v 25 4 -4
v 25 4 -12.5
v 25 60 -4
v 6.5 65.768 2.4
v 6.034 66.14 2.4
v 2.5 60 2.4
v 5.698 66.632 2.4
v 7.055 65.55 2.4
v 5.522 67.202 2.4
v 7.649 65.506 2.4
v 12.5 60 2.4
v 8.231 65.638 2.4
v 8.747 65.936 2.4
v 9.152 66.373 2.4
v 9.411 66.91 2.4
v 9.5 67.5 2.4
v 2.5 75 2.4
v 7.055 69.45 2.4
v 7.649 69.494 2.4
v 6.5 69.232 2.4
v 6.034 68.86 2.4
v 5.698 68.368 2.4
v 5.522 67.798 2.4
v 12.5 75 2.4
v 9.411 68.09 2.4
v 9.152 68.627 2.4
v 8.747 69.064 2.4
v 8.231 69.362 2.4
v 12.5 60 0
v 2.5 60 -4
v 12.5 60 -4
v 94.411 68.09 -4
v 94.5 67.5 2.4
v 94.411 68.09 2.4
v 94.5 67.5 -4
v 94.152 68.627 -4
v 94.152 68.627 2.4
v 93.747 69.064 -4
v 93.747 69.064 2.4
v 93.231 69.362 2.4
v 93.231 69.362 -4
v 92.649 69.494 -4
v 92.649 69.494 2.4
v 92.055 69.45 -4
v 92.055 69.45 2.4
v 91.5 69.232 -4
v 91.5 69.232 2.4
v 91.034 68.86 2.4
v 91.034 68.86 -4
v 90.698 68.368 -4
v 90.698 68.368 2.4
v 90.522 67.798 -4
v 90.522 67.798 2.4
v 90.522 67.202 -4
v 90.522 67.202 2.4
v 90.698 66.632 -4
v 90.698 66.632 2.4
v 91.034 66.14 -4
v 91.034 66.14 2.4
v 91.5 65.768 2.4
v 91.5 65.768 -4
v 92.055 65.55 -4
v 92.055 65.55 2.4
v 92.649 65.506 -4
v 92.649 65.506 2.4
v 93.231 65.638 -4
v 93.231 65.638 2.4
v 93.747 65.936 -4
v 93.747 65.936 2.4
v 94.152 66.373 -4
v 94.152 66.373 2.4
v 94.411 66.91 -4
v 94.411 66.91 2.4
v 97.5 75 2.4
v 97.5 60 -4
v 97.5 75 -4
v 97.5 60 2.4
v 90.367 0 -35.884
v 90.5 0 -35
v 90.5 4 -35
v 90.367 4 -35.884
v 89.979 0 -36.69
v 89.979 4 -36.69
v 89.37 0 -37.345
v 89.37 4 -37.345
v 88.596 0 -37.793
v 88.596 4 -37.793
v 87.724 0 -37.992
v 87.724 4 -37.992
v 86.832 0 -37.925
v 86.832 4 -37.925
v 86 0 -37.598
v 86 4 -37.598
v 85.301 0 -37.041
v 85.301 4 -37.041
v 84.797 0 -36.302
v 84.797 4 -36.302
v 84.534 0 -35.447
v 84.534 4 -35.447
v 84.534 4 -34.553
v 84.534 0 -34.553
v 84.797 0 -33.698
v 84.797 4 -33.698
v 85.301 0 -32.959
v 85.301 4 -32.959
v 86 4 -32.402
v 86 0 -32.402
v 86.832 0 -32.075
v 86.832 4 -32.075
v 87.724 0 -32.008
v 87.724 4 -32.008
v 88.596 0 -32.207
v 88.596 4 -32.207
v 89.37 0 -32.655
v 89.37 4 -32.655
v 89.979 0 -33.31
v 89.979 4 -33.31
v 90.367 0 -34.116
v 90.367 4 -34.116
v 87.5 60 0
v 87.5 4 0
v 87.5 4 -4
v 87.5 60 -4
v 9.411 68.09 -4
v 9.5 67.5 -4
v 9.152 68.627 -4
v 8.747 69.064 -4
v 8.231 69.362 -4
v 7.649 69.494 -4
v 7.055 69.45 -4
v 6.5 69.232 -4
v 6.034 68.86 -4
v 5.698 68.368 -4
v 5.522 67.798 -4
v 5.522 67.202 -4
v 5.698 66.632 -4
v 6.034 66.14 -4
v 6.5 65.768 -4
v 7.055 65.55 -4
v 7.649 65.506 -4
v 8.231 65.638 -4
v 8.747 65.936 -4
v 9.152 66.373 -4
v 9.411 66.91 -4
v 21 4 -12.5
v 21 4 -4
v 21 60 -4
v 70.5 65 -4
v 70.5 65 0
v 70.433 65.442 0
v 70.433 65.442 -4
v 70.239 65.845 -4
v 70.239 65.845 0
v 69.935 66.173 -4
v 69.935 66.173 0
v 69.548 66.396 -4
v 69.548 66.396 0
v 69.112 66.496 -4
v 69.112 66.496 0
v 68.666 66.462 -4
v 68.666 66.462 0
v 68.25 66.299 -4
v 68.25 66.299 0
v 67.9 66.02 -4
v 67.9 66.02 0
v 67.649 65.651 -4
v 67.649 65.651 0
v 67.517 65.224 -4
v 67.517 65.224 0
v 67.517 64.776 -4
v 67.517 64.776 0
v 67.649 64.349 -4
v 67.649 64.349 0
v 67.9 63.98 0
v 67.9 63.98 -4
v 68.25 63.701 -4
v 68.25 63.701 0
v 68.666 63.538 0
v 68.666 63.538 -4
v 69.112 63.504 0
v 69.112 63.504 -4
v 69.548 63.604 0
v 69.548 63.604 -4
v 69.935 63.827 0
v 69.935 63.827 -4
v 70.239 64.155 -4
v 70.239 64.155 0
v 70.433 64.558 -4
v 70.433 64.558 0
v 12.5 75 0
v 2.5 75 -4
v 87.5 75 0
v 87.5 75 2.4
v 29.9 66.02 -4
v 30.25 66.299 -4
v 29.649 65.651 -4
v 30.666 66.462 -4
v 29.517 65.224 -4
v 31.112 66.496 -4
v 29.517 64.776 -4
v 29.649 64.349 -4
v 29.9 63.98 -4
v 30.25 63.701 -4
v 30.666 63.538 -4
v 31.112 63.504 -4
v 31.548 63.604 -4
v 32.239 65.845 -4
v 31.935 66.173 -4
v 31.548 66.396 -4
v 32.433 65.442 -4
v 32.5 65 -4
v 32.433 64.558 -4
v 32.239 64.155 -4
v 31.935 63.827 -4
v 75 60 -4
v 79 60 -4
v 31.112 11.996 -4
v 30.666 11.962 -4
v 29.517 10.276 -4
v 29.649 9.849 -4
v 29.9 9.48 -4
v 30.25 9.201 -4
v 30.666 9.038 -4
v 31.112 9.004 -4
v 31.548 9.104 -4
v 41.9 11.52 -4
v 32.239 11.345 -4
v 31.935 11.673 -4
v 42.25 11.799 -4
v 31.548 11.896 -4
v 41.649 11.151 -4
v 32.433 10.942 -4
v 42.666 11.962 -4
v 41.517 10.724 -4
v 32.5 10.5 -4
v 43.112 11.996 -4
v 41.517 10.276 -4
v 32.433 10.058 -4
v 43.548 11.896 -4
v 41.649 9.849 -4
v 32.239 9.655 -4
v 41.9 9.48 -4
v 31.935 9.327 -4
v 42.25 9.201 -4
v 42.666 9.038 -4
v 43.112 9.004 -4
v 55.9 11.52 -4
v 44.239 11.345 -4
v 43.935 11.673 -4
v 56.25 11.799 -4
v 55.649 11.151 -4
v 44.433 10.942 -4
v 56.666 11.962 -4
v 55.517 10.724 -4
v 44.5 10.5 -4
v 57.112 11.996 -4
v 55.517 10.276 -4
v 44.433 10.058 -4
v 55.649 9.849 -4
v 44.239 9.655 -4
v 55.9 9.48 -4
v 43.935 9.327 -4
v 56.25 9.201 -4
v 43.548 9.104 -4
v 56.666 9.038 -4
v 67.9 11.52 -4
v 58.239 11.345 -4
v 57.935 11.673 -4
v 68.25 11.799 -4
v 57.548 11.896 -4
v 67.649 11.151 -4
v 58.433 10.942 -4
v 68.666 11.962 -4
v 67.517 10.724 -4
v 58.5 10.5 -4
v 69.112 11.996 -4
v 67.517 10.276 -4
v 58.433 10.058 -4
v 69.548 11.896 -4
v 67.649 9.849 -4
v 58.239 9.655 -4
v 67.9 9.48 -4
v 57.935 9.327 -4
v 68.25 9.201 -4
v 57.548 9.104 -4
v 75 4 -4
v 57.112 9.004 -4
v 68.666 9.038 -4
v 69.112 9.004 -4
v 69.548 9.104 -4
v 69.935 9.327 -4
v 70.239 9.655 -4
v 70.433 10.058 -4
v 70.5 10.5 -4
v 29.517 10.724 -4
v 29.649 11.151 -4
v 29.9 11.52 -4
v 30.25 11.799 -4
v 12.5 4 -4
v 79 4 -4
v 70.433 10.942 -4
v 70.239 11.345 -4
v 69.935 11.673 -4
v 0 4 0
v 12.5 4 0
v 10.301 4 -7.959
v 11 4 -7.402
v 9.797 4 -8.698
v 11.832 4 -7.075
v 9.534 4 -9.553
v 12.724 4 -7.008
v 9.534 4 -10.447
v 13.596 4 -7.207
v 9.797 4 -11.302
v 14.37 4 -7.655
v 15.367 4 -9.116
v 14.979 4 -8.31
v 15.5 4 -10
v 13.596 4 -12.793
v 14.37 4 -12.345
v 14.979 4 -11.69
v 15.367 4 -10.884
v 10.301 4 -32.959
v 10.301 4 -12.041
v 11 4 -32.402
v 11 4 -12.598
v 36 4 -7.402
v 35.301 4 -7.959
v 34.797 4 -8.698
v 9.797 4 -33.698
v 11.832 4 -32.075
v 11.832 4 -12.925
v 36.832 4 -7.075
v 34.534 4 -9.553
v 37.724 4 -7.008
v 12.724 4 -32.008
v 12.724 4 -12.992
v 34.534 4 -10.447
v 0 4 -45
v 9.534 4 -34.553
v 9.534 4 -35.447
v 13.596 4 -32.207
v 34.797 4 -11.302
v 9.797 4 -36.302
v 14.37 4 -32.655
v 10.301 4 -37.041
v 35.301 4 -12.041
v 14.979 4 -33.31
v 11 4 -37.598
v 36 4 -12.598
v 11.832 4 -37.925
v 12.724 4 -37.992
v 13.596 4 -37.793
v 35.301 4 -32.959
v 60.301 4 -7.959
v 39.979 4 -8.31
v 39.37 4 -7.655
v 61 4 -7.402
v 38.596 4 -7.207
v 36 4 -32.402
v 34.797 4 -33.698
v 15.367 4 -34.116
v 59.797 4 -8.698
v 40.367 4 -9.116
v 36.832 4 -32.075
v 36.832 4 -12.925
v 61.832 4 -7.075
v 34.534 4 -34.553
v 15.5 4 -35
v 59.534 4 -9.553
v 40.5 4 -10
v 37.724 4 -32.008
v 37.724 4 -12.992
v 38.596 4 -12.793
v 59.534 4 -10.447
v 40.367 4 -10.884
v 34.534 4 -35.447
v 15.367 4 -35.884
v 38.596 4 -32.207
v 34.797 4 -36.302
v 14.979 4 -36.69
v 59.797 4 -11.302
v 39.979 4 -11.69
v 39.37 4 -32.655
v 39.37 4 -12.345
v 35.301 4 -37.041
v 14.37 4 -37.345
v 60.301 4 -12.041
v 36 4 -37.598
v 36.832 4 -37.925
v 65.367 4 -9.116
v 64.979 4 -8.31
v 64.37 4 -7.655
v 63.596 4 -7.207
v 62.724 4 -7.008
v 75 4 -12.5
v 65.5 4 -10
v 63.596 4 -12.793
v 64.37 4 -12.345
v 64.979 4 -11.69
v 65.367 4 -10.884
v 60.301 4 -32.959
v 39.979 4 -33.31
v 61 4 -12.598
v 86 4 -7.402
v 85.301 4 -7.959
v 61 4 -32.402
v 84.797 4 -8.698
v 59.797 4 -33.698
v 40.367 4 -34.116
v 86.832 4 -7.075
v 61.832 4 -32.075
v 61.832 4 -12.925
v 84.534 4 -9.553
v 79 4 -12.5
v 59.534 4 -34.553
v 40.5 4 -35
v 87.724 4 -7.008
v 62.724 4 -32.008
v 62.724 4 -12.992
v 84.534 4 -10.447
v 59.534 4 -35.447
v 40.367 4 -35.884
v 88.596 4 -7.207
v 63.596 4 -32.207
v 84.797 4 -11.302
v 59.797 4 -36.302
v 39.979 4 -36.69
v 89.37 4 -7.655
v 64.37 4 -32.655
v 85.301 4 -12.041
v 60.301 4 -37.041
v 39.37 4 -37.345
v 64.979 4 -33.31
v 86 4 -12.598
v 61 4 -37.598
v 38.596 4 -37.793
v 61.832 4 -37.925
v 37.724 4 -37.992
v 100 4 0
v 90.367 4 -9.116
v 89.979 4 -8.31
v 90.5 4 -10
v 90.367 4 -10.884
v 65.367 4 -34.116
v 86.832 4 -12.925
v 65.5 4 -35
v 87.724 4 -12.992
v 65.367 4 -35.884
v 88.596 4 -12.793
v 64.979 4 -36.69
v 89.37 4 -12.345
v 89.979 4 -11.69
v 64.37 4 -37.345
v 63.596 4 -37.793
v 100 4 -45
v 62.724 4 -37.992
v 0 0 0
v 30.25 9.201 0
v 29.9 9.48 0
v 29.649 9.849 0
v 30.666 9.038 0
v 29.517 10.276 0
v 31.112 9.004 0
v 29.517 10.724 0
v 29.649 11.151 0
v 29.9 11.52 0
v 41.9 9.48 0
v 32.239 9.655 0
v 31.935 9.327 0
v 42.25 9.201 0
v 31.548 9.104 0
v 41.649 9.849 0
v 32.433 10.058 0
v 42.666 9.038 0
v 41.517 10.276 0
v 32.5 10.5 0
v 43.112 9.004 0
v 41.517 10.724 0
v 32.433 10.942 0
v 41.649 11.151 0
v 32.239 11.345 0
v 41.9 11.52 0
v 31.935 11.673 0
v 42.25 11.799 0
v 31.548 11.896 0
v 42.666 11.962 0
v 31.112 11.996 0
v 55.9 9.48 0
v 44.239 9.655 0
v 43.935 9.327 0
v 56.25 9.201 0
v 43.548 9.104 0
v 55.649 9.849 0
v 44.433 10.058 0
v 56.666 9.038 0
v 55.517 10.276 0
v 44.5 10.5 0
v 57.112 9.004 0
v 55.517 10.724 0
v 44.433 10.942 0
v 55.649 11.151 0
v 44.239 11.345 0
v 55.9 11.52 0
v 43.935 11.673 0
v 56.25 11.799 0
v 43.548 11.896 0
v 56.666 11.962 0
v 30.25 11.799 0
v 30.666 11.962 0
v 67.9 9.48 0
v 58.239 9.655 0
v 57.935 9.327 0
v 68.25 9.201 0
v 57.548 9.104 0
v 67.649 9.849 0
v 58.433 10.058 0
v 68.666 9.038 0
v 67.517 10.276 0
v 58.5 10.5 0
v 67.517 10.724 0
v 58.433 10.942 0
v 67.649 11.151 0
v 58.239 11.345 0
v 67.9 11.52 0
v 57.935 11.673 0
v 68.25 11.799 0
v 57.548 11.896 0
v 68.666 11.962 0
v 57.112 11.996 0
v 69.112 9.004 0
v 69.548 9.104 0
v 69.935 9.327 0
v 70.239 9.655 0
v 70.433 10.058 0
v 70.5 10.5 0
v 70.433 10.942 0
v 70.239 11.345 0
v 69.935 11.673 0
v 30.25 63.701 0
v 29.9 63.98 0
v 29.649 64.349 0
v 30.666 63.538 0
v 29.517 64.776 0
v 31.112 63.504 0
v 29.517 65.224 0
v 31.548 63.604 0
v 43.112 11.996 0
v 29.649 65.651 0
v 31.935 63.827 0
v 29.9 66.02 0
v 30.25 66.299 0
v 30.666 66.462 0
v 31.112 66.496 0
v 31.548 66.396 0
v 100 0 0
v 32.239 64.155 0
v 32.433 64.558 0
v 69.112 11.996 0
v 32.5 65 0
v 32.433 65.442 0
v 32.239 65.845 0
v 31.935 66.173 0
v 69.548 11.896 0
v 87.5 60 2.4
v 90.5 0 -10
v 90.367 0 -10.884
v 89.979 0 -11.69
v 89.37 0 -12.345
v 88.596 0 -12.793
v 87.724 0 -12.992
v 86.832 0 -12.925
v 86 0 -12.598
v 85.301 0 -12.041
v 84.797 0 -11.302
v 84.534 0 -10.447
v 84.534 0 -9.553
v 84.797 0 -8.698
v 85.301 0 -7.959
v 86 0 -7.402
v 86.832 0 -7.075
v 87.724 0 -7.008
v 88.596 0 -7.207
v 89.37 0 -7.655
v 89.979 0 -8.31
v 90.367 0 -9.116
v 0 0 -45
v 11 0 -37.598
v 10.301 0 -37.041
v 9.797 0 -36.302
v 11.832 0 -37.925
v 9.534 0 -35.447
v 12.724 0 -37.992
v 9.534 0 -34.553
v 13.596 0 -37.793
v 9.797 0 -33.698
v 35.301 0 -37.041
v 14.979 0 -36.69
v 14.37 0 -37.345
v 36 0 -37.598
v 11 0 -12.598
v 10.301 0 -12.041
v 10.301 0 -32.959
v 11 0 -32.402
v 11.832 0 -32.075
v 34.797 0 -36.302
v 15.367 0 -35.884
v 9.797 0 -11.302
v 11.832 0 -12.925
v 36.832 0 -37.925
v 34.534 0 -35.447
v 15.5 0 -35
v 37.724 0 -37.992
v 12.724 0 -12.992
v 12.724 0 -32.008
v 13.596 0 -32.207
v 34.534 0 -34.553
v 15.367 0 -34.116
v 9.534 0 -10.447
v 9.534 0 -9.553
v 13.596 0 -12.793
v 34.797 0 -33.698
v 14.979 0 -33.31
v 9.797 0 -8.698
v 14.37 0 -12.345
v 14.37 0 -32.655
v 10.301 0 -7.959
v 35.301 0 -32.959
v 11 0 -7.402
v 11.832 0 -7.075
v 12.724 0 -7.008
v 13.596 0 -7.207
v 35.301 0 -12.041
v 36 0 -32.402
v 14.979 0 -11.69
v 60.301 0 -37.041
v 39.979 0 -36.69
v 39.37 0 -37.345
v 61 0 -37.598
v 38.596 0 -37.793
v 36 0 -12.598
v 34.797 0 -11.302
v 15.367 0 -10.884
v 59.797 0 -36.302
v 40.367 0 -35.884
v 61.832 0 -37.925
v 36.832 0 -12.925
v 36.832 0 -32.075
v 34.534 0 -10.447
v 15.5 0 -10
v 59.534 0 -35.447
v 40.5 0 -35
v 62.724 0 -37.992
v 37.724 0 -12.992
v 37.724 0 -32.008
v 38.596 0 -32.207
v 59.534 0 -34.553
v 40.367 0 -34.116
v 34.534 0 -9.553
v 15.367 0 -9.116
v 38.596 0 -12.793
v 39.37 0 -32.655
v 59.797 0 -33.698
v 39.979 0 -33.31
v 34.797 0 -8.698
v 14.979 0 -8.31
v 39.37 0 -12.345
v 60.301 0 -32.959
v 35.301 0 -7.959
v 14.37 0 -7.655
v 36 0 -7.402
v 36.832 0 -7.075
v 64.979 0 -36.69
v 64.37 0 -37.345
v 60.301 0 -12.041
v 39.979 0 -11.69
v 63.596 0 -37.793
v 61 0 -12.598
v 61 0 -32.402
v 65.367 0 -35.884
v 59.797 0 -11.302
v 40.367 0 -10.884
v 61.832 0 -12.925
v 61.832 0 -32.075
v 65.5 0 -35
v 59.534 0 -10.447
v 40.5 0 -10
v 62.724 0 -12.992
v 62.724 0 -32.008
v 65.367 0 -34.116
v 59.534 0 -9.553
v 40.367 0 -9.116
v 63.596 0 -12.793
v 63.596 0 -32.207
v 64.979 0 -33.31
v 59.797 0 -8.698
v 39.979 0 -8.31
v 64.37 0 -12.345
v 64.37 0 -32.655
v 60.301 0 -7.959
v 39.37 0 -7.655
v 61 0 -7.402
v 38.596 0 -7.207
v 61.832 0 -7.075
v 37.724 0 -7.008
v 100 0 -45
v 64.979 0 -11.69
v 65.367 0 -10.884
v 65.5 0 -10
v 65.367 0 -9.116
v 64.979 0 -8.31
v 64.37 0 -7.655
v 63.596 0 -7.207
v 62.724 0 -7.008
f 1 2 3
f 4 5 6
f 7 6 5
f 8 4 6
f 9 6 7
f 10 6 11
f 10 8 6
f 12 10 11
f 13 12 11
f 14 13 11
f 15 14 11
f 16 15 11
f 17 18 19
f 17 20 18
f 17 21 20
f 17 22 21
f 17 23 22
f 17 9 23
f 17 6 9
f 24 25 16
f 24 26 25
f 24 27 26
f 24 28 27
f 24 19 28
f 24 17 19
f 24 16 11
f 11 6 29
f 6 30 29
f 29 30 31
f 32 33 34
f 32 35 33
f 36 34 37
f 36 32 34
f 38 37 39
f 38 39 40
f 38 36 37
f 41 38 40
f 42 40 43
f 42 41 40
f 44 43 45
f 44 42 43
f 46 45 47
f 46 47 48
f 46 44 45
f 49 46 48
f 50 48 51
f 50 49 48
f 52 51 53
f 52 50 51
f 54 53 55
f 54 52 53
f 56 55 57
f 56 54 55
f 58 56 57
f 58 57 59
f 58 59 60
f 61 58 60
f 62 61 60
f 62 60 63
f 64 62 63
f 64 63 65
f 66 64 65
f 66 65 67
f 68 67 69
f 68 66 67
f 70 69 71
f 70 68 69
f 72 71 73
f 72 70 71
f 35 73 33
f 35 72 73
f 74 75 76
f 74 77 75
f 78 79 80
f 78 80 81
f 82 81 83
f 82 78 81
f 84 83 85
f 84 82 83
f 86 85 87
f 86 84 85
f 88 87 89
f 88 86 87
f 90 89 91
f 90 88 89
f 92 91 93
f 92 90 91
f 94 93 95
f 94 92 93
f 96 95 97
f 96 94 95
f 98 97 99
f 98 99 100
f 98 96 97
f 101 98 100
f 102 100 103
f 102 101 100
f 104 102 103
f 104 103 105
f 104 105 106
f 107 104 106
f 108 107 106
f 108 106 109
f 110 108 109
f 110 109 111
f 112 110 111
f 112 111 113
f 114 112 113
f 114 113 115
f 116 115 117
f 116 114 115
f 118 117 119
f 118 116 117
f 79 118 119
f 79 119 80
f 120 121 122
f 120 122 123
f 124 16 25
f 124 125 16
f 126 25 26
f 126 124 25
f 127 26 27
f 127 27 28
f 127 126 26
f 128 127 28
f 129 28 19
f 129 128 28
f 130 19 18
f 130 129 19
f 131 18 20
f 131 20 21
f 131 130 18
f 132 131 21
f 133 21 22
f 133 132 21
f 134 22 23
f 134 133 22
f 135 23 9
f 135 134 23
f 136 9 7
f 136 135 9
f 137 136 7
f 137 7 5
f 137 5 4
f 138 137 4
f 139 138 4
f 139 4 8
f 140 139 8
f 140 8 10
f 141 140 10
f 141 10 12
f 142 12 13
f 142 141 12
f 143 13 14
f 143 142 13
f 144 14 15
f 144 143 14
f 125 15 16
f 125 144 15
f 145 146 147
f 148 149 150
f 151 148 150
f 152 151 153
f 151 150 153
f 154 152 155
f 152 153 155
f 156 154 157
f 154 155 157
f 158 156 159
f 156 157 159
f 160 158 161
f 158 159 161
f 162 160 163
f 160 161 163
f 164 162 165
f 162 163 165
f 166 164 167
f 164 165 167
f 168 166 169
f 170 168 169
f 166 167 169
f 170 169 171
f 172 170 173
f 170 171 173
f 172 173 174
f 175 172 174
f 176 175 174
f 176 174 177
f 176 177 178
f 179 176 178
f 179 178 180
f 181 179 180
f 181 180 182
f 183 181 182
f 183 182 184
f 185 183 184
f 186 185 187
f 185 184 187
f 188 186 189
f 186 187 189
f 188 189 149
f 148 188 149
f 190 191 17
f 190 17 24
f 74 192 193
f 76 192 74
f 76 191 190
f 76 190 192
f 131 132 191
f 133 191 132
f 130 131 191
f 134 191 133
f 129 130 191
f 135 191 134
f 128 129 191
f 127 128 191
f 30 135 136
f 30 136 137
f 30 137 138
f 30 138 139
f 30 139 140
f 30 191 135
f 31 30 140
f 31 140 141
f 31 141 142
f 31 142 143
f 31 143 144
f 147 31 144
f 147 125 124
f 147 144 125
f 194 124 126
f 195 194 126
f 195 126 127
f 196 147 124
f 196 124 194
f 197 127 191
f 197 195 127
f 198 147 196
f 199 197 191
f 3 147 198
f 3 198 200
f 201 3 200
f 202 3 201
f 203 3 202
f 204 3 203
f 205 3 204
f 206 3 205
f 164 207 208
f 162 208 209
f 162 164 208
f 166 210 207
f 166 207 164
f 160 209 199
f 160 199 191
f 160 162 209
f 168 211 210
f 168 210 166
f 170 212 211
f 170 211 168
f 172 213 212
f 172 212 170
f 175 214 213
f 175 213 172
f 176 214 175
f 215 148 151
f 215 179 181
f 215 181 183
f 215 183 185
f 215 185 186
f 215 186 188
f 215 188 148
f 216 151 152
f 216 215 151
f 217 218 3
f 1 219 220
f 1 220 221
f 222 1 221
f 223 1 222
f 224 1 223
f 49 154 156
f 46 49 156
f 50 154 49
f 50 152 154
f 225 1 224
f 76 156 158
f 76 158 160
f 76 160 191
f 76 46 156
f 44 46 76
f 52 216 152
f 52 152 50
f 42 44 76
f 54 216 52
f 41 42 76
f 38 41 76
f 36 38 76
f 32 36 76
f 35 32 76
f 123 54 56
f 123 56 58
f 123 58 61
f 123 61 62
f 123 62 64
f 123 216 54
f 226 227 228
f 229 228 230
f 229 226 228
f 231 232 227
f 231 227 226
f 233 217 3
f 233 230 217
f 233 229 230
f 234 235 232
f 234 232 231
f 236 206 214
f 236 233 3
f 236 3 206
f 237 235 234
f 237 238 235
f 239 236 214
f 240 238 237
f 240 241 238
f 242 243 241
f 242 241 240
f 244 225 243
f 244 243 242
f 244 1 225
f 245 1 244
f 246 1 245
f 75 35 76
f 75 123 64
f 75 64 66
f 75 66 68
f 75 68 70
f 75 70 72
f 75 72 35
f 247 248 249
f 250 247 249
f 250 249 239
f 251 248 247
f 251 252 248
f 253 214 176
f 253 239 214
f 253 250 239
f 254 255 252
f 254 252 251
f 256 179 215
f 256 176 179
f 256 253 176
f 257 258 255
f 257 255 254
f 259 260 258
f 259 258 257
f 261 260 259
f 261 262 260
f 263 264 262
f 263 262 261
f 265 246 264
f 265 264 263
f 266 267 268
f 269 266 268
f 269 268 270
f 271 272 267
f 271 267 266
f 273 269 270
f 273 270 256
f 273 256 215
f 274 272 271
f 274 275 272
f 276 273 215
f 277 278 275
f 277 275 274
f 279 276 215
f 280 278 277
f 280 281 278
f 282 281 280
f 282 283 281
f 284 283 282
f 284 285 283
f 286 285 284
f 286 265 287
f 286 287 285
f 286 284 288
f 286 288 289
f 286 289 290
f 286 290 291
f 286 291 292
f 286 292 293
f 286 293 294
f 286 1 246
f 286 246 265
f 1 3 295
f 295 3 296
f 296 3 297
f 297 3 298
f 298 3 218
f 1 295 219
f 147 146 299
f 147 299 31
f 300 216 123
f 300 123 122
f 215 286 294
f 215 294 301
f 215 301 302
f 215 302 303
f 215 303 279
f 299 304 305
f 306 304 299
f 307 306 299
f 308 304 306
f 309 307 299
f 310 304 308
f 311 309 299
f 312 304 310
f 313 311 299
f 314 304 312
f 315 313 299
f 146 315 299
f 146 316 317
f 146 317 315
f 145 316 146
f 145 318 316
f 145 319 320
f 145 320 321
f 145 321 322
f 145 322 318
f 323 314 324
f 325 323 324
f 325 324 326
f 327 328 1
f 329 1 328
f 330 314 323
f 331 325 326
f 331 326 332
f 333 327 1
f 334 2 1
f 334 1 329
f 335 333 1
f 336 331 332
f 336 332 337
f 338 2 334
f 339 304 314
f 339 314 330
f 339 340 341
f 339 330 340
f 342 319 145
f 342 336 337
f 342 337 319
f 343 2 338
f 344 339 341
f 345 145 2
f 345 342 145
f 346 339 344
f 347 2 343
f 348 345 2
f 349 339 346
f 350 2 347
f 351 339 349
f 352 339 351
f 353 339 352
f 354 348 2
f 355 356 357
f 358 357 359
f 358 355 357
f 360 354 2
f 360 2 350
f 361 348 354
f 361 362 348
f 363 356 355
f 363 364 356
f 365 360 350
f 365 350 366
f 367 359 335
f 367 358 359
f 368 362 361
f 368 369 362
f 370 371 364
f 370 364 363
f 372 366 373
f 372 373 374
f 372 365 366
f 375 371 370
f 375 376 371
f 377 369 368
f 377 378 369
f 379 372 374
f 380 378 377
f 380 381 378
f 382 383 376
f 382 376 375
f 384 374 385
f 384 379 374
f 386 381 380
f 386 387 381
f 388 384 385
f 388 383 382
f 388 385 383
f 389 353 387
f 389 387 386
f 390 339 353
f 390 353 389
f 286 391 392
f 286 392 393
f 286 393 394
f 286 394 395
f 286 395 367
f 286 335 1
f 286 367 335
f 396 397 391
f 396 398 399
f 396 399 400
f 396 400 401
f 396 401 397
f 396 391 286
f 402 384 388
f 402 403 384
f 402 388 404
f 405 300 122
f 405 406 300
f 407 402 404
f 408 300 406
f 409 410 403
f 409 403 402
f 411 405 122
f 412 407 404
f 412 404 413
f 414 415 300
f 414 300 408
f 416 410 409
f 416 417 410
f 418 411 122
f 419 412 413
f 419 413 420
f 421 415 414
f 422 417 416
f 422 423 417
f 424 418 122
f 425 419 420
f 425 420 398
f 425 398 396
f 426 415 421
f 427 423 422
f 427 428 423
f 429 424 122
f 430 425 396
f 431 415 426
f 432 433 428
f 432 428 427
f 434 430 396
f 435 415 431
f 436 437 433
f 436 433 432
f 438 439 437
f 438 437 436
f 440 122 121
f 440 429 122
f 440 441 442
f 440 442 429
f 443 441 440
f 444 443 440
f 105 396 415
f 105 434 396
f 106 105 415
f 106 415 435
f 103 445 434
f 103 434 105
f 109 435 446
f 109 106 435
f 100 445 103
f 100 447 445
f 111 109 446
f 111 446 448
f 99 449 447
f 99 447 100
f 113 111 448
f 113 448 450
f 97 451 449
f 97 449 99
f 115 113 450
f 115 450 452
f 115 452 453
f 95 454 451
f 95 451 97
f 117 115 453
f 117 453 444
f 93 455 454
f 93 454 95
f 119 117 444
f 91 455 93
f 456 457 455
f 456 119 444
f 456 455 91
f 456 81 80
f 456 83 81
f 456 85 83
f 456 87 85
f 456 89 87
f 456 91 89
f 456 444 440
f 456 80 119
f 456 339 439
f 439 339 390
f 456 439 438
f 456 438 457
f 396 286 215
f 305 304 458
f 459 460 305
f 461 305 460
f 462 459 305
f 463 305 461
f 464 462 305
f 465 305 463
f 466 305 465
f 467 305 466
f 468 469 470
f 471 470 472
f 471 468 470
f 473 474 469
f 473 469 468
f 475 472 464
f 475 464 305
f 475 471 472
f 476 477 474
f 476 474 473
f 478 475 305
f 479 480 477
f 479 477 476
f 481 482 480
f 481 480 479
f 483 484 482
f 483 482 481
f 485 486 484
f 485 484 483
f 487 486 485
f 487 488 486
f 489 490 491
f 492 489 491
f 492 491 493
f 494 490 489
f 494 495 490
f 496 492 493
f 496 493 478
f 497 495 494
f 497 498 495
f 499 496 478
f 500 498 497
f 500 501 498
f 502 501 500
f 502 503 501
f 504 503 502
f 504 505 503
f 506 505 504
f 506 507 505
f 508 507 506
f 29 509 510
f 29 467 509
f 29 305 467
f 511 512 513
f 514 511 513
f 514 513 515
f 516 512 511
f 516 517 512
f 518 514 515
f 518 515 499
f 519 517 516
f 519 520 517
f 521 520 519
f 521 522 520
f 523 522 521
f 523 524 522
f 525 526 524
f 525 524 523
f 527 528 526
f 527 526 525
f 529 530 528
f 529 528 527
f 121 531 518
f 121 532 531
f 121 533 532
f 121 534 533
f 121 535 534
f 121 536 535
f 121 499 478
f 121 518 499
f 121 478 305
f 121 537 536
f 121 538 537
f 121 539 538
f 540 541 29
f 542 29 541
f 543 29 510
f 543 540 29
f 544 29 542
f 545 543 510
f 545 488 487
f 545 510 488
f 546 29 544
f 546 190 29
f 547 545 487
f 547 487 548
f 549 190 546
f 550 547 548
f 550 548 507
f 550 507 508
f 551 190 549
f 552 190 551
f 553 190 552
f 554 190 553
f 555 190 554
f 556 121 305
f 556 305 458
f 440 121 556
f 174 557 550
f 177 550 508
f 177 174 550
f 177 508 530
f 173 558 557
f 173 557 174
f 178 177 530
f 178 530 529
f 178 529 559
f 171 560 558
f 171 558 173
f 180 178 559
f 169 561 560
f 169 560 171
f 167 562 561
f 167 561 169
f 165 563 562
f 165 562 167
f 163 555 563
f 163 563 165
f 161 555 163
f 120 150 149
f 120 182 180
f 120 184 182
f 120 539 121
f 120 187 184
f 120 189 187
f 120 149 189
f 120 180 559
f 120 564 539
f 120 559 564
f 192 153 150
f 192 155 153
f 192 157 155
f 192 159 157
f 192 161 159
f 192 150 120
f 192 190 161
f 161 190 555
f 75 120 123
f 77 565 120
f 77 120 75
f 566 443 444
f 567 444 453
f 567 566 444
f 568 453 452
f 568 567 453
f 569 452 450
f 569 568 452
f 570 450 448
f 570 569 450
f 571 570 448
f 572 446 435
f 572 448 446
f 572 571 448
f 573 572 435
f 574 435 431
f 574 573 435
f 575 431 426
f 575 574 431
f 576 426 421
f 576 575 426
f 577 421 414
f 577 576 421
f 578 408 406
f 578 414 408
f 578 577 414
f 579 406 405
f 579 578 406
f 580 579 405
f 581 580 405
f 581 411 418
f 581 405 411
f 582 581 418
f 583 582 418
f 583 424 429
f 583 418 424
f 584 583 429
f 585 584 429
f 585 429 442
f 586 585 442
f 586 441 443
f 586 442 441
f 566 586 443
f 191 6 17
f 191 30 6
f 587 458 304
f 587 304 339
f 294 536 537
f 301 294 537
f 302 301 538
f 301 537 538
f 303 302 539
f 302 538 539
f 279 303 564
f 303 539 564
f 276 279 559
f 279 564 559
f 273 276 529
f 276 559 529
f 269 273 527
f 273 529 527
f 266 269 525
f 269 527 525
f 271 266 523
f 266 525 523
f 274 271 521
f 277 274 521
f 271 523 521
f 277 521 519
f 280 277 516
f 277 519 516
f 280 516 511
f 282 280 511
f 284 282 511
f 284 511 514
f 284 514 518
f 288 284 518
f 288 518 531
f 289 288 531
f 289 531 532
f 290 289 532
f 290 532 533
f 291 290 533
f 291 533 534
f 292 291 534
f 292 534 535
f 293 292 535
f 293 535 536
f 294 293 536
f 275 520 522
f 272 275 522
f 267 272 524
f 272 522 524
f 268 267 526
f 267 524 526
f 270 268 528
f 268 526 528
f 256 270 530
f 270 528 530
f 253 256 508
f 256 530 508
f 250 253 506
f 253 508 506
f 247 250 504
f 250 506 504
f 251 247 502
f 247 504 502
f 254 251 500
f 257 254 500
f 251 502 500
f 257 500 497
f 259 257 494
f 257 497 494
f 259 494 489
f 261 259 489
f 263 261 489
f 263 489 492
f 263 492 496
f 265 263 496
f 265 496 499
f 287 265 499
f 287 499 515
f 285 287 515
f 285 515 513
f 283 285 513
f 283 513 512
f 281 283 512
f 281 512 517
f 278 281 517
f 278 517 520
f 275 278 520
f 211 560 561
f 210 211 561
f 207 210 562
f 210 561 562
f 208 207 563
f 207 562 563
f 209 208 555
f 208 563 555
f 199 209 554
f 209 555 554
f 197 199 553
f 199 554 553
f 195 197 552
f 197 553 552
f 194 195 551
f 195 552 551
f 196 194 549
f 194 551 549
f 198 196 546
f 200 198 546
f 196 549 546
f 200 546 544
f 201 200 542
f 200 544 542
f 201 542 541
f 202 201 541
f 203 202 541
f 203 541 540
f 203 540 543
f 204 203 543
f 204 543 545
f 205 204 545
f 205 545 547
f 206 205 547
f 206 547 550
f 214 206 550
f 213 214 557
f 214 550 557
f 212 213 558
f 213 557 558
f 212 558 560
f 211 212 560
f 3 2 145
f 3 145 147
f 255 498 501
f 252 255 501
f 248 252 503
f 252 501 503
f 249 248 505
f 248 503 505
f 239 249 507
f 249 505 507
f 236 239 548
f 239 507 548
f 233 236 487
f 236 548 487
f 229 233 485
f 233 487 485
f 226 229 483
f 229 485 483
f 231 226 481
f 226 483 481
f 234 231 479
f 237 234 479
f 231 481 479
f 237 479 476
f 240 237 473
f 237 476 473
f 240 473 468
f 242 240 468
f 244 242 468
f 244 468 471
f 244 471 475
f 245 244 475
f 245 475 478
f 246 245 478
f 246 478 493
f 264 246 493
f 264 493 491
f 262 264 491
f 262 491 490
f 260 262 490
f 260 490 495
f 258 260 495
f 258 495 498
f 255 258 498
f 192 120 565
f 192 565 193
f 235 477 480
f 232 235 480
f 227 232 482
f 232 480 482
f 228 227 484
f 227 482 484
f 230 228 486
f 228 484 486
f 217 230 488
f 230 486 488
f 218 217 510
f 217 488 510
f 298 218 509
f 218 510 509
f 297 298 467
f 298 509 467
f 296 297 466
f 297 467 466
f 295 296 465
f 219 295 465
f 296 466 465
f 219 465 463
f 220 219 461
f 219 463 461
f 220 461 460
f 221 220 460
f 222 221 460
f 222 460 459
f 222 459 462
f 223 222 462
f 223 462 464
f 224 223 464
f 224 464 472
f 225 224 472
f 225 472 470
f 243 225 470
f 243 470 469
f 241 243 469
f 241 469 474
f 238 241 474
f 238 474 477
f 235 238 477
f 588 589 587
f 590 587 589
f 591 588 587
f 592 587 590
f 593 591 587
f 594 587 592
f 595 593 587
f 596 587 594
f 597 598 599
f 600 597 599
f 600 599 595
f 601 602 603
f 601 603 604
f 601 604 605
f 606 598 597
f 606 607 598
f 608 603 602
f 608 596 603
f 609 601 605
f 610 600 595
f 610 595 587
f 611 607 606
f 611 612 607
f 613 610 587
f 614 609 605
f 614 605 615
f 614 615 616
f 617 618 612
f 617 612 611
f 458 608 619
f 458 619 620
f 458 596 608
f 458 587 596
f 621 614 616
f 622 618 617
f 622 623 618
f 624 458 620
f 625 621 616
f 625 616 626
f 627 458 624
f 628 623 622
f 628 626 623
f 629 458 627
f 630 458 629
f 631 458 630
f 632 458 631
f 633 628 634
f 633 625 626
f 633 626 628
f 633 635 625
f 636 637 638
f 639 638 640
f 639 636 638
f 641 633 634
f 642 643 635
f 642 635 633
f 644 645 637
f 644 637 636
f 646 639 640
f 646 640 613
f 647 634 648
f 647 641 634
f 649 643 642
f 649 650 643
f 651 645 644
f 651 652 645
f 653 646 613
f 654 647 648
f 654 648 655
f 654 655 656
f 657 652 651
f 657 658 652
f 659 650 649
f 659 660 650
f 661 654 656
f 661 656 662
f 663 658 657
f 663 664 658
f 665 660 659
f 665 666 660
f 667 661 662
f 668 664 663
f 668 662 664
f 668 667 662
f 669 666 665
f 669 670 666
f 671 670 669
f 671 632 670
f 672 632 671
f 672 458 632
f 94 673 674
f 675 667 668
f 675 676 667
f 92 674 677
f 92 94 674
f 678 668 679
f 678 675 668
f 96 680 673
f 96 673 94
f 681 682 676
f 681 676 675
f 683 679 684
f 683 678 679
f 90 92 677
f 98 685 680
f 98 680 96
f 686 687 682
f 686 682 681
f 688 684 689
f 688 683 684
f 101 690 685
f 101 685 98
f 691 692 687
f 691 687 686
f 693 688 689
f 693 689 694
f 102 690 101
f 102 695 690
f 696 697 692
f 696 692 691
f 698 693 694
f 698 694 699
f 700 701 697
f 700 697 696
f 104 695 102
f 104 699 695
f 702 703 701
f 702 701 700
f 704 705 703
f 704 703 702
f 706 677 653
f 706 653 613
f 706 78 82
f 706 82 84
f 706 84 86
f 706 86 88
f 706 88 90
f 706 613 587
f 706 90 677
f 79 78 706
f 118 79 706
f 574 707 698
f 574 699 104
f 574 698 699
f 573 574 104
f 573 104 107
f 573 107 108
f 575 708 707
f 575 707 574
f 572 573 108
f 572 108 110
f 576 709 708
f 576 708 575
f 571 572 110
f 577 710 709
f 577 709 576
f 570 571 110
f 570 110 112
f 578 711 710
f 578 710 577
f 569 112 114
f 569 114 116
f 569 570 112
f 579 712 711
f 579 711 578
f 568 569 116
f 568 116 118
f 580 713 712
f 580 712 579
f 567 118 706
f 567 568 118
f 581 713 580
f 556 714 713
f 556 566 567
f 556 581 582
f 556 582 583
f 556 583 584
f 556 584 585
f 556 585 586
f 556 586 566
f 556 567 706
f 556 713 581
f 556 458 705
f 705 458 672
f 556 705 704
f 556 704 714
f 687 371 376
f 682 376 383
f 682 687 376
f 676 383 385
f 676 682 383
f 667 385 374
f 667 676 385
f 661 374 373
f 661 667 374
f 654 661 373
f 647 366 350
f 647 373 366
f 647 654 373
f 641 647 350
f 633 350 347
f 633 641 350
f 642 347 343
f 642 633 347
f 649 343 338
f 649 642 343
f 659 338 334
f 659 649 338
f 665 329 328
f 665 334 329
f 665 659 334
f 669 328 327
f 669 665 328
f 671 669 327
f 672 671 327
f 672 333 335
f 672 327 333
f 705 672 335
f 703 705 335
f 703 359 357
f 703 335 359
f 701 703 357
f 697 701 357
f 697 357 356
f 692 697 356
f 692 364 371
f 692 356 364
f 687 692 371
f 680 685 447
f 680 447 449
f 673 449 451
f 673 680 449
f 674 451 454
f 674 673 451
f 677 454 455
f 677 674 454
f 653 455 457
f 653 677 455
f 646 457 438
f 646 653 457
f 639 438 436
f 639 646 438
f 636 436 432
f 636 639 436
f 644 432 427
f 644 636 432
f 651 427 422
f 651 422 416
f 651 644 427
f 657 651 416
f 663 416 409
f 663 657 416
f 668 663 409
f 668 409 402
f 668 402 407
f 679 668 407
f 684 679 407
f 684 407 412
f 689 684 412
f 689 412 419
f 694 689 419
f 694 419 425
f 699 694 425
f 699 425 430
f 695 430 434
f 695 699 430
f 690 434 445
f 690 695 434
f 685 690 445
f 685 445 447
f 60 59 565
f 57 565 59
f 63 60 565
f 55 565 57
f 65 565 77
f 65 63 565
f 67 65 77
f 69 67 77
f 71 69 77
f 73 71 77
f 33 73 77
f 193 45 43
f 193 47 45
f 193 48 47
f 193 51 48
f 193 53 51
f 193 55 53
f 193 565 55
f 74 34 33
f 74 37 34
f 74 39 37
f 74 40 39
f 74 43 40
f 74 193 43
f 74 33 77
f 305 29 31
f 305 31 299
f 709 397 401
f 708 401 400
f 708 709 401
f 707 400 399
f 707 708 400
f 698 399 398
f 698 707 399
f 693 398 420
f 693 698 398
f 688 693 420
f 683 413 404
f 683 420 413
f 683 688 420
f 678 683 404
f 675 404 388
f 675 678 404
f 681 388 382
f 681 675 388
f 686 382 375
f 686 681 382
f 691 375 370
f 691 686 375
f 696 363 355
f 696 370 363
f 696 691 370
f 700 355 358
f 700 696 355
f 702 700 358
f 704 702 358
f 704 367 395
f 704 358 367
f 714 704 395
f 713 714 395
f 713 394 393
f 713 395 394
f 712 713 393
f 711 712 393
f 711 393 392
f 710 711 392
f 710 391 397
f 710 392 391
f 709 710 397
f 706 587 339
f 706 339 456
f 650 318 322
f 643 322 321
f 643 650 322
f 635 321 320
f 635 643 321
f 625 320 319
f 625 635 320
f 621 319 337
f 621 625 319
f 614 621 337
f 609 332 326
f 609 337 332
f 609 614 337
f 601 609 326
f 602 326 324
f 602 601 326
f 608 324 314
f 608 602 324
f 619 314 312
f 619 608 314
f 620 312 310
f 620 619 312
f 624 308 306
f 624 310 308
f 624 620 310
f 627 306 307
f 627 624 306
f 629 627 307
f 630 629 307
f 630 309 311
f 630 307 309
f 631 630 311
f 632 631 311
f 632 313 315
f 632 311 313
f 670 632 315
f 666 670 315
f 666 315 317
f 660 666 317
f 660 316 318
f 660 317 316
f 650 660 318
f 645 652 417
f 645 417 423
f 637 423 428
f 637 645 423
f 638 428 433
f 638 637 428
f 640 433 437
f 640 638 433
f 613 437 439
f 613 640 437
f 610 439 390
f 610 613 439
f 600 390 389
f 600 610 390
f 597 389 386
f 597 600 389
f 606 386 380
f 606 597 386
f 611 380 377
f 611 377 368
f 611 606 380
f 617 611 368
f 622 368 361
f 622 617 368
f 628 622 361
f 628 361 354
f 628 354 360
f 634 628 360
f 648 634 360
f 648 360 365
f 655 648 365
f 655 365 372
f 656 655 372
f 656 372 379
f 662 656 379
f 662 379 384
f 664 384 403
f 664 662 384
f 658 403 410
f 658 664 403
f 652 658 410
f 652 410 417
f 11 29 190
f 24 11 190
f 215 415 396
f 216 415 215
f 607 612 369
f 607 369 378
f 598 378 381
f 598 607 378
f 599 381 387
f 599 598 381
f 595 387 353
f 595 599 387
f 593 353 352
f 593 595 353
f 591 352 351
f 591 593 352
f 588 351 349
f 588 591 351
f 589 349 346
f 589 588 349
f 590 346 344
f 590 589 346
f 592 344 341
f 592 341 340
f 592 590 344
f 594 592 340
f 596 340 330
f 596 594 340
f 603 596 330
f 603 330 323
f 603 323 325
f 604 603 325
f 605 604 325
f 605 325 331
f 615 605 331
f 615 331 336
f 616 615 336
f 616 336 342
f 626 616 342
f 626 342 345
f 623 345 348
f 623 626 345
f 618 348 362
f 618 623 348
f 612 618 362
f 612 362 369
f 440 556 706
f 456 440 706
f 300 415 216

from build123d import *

# Parameters (mm, degrees)
SKETCH_1_W          = 100
SKETCH_1_H          = 45
SKETCH_1_R          = 3
EXTRUDE_1_DEPTH     = 4
SKETCH_2_R          = 1.5
SKETCH_2_R_2        = 2
EXTRUDE_2_DEPTH     = 4
SKETCH_3_W          = 10
SKETCH_3_H          = 15
SKETCH_3_R          = 2
EXTRUDE_3_DEPTH     = 2.4
EXTRUDE_4_DEPTH     = 75
SKETCH_5_R          = 1.5
CUT_EXTRUDE_1_DEPTH = 75
CUT_EXTRUDE_2_DEPTH = 75


with BuildPart() as part:
    # 草图1 → 凸台-拉伸1 (new body)
    with BuildSketch(Plane(origin=(0, 0, 0), x_dir=(1, 0, 0), z_dir=(0, 1, 0))):
        with Locations((50, 22.5)):
            Rectangle(SKETCH_1_W, SKETCH_1_H)
        with Locations((12.5, 35)):
            Circle(SKETCH_1_R, mode=Mode.SUBTRACT)
        with Locations((37.5, 35)):
            Circle(SKETCH_1_R, mode=Mode.SUBTRACT)
        with Locations((37.5, 10)):
            Circle(SKETCH_1_R, mode=Mode.SUBTRACT)
        with Locations((12.5, 10)):
            Circle(SKETCH_1_R, mode=Mode.SUBTRACT)
        with Locations((62.5, 35)):
            Circle(SKETCH_1_R, mode=Mode.SUBTRACT)
        with Locations((62.5, 10)):
            Circle(SKETCH_1_R, mode=Mode.SUBTRACT)
        with Locations((87.5, 10)):
            Circle(SKETCH_1_R, mode=Mode.SUBTRACT)
        with Locations((87.5, 35)):
            Circle(SKETCH_1_R, mode=Mode.SUBTRACT)
    extrude(amount=EXTRUDE_1_DEPTH)

    # 草图2 → 凸台-拉伸2 (add)
    with BuildSketch(Plane.XY):
        Polygon((12.5, 60), (12.5, 0), (87.5, 0), (87.5, 60), (97.5, 60), (97.5, 75), (2.5, 75), (2.5, 60), align=None)
        with Locations((31, 10.5)):
            Circle(SKETCH_2_R, mode=Mode.SUBTRACT)
        with Locations((43, 10.5)):
            Circle(SKETCH_2_R, mode=Mode.SUBTRACT)
        with Locations((57, 10.5)):
            Circle(SKETCH_2_R, mode=Mode.SUBTRACT)
        with Locations((69, 10.5)):
            Circle(SKETCH_2_R, mode=Mode.SUBTRACT)
        with Locations((7.5, 67.5)):
            Circle(SKETCH_2_R_2, mode=Mode.SUBTRACT)
        with Locations((31, 65)):
            Circle(SKETCH_2_R, mode=Mode.SUBTRACT)
        with Locations((69, 65)):
            Circle(SKETCH_2_R, mode=Mode.SUBTRACT)
        with Locations((92.5, 67.5)):
            Circle(SKETCH_2_R_2, mode=Mode.SUBTRACT)
    extrude(amount=-EXTRUDE_2_DEPTH)

    # 草图3 → 凸台-拉伸3 (add)
    with BuildSketch(Plane.XY):
        with Locations((7.5, 67.5)):
            Rectangle(SKETCH_3_W, SKETCH_3_H)
        with Locations((7.5, 67.5)):
            Circle(SKETCH_3_R, mode=Mode.SUBTRACT)
        with Locations((92.5, 67.5)):
            Rectangle(SKETCH_3_W, SKETCH_3_H)
        with Locations((92.5, 67.5)):
            Circle(SKETCH_3_R, mode=Mode.SUBTRACT)
    extrude(amount=EXTRUDE_3_DEPTH)

    # 草图4 → 凸台-拉伸4 (add)
    with BuildSketch(Plane(origin=(87.5, 0, 0), x_dir=(0, 0, -1), z_dir=(1, 0, 0))):
        Polygon((4, 60), (4, 4), (12.5, 4), align=None)
    extrude(amount=-EXTRUDE_4_DEPTH)

    # 草图5 → 切除-拉伸1 (cut)
    with BuildSketch(Plane.XY):
        with Locations((31, 10.5)):
            Circle(SKETCH_5_R)
        with Locations((43, 10.5)):
            Circle(SKETCH_5_R)
        with Locations((57, 10.5)):
            Circle(SKETCH_5_R)
        with Locations((69, 10.5)):
            Circle(SKETCH_5_R)
    extrude(amount=-CUT_EXTRUDE_1_DEPTH, mode=Mode.SUBTRACT)

    # 草图6 → 切除-拉伸2 (cut)
    with BuildSketch(Plane(origin=(0, 4, 0), x_dir=(1, 0, 0), z_dir=(0, 1, 0))):
        Polygon((12.5, 7), (12.5, 4), (21, 4), (21, 12.5), (14.158312395, 12.5), (12.5, 12.5), align=None)
        Polygon((25, 12.5), (25, 4), (75, 4), (75, 12.5), (64.158312395, 12.5), (60.841687605, 12.5), (39.158312395, 12.5), (35.841687605, 12.5), align=None)
        Polygon((79, 12.5), (79, 4), (87.5, 4), (87.5, 7), (87.5, 12.5), (85.841687605, 12.5), align=None)
    extrude(amount=CUT_EXTRUDE_2_DEPTH, mode=Mode.SUBTRACT)


solid = part.part
